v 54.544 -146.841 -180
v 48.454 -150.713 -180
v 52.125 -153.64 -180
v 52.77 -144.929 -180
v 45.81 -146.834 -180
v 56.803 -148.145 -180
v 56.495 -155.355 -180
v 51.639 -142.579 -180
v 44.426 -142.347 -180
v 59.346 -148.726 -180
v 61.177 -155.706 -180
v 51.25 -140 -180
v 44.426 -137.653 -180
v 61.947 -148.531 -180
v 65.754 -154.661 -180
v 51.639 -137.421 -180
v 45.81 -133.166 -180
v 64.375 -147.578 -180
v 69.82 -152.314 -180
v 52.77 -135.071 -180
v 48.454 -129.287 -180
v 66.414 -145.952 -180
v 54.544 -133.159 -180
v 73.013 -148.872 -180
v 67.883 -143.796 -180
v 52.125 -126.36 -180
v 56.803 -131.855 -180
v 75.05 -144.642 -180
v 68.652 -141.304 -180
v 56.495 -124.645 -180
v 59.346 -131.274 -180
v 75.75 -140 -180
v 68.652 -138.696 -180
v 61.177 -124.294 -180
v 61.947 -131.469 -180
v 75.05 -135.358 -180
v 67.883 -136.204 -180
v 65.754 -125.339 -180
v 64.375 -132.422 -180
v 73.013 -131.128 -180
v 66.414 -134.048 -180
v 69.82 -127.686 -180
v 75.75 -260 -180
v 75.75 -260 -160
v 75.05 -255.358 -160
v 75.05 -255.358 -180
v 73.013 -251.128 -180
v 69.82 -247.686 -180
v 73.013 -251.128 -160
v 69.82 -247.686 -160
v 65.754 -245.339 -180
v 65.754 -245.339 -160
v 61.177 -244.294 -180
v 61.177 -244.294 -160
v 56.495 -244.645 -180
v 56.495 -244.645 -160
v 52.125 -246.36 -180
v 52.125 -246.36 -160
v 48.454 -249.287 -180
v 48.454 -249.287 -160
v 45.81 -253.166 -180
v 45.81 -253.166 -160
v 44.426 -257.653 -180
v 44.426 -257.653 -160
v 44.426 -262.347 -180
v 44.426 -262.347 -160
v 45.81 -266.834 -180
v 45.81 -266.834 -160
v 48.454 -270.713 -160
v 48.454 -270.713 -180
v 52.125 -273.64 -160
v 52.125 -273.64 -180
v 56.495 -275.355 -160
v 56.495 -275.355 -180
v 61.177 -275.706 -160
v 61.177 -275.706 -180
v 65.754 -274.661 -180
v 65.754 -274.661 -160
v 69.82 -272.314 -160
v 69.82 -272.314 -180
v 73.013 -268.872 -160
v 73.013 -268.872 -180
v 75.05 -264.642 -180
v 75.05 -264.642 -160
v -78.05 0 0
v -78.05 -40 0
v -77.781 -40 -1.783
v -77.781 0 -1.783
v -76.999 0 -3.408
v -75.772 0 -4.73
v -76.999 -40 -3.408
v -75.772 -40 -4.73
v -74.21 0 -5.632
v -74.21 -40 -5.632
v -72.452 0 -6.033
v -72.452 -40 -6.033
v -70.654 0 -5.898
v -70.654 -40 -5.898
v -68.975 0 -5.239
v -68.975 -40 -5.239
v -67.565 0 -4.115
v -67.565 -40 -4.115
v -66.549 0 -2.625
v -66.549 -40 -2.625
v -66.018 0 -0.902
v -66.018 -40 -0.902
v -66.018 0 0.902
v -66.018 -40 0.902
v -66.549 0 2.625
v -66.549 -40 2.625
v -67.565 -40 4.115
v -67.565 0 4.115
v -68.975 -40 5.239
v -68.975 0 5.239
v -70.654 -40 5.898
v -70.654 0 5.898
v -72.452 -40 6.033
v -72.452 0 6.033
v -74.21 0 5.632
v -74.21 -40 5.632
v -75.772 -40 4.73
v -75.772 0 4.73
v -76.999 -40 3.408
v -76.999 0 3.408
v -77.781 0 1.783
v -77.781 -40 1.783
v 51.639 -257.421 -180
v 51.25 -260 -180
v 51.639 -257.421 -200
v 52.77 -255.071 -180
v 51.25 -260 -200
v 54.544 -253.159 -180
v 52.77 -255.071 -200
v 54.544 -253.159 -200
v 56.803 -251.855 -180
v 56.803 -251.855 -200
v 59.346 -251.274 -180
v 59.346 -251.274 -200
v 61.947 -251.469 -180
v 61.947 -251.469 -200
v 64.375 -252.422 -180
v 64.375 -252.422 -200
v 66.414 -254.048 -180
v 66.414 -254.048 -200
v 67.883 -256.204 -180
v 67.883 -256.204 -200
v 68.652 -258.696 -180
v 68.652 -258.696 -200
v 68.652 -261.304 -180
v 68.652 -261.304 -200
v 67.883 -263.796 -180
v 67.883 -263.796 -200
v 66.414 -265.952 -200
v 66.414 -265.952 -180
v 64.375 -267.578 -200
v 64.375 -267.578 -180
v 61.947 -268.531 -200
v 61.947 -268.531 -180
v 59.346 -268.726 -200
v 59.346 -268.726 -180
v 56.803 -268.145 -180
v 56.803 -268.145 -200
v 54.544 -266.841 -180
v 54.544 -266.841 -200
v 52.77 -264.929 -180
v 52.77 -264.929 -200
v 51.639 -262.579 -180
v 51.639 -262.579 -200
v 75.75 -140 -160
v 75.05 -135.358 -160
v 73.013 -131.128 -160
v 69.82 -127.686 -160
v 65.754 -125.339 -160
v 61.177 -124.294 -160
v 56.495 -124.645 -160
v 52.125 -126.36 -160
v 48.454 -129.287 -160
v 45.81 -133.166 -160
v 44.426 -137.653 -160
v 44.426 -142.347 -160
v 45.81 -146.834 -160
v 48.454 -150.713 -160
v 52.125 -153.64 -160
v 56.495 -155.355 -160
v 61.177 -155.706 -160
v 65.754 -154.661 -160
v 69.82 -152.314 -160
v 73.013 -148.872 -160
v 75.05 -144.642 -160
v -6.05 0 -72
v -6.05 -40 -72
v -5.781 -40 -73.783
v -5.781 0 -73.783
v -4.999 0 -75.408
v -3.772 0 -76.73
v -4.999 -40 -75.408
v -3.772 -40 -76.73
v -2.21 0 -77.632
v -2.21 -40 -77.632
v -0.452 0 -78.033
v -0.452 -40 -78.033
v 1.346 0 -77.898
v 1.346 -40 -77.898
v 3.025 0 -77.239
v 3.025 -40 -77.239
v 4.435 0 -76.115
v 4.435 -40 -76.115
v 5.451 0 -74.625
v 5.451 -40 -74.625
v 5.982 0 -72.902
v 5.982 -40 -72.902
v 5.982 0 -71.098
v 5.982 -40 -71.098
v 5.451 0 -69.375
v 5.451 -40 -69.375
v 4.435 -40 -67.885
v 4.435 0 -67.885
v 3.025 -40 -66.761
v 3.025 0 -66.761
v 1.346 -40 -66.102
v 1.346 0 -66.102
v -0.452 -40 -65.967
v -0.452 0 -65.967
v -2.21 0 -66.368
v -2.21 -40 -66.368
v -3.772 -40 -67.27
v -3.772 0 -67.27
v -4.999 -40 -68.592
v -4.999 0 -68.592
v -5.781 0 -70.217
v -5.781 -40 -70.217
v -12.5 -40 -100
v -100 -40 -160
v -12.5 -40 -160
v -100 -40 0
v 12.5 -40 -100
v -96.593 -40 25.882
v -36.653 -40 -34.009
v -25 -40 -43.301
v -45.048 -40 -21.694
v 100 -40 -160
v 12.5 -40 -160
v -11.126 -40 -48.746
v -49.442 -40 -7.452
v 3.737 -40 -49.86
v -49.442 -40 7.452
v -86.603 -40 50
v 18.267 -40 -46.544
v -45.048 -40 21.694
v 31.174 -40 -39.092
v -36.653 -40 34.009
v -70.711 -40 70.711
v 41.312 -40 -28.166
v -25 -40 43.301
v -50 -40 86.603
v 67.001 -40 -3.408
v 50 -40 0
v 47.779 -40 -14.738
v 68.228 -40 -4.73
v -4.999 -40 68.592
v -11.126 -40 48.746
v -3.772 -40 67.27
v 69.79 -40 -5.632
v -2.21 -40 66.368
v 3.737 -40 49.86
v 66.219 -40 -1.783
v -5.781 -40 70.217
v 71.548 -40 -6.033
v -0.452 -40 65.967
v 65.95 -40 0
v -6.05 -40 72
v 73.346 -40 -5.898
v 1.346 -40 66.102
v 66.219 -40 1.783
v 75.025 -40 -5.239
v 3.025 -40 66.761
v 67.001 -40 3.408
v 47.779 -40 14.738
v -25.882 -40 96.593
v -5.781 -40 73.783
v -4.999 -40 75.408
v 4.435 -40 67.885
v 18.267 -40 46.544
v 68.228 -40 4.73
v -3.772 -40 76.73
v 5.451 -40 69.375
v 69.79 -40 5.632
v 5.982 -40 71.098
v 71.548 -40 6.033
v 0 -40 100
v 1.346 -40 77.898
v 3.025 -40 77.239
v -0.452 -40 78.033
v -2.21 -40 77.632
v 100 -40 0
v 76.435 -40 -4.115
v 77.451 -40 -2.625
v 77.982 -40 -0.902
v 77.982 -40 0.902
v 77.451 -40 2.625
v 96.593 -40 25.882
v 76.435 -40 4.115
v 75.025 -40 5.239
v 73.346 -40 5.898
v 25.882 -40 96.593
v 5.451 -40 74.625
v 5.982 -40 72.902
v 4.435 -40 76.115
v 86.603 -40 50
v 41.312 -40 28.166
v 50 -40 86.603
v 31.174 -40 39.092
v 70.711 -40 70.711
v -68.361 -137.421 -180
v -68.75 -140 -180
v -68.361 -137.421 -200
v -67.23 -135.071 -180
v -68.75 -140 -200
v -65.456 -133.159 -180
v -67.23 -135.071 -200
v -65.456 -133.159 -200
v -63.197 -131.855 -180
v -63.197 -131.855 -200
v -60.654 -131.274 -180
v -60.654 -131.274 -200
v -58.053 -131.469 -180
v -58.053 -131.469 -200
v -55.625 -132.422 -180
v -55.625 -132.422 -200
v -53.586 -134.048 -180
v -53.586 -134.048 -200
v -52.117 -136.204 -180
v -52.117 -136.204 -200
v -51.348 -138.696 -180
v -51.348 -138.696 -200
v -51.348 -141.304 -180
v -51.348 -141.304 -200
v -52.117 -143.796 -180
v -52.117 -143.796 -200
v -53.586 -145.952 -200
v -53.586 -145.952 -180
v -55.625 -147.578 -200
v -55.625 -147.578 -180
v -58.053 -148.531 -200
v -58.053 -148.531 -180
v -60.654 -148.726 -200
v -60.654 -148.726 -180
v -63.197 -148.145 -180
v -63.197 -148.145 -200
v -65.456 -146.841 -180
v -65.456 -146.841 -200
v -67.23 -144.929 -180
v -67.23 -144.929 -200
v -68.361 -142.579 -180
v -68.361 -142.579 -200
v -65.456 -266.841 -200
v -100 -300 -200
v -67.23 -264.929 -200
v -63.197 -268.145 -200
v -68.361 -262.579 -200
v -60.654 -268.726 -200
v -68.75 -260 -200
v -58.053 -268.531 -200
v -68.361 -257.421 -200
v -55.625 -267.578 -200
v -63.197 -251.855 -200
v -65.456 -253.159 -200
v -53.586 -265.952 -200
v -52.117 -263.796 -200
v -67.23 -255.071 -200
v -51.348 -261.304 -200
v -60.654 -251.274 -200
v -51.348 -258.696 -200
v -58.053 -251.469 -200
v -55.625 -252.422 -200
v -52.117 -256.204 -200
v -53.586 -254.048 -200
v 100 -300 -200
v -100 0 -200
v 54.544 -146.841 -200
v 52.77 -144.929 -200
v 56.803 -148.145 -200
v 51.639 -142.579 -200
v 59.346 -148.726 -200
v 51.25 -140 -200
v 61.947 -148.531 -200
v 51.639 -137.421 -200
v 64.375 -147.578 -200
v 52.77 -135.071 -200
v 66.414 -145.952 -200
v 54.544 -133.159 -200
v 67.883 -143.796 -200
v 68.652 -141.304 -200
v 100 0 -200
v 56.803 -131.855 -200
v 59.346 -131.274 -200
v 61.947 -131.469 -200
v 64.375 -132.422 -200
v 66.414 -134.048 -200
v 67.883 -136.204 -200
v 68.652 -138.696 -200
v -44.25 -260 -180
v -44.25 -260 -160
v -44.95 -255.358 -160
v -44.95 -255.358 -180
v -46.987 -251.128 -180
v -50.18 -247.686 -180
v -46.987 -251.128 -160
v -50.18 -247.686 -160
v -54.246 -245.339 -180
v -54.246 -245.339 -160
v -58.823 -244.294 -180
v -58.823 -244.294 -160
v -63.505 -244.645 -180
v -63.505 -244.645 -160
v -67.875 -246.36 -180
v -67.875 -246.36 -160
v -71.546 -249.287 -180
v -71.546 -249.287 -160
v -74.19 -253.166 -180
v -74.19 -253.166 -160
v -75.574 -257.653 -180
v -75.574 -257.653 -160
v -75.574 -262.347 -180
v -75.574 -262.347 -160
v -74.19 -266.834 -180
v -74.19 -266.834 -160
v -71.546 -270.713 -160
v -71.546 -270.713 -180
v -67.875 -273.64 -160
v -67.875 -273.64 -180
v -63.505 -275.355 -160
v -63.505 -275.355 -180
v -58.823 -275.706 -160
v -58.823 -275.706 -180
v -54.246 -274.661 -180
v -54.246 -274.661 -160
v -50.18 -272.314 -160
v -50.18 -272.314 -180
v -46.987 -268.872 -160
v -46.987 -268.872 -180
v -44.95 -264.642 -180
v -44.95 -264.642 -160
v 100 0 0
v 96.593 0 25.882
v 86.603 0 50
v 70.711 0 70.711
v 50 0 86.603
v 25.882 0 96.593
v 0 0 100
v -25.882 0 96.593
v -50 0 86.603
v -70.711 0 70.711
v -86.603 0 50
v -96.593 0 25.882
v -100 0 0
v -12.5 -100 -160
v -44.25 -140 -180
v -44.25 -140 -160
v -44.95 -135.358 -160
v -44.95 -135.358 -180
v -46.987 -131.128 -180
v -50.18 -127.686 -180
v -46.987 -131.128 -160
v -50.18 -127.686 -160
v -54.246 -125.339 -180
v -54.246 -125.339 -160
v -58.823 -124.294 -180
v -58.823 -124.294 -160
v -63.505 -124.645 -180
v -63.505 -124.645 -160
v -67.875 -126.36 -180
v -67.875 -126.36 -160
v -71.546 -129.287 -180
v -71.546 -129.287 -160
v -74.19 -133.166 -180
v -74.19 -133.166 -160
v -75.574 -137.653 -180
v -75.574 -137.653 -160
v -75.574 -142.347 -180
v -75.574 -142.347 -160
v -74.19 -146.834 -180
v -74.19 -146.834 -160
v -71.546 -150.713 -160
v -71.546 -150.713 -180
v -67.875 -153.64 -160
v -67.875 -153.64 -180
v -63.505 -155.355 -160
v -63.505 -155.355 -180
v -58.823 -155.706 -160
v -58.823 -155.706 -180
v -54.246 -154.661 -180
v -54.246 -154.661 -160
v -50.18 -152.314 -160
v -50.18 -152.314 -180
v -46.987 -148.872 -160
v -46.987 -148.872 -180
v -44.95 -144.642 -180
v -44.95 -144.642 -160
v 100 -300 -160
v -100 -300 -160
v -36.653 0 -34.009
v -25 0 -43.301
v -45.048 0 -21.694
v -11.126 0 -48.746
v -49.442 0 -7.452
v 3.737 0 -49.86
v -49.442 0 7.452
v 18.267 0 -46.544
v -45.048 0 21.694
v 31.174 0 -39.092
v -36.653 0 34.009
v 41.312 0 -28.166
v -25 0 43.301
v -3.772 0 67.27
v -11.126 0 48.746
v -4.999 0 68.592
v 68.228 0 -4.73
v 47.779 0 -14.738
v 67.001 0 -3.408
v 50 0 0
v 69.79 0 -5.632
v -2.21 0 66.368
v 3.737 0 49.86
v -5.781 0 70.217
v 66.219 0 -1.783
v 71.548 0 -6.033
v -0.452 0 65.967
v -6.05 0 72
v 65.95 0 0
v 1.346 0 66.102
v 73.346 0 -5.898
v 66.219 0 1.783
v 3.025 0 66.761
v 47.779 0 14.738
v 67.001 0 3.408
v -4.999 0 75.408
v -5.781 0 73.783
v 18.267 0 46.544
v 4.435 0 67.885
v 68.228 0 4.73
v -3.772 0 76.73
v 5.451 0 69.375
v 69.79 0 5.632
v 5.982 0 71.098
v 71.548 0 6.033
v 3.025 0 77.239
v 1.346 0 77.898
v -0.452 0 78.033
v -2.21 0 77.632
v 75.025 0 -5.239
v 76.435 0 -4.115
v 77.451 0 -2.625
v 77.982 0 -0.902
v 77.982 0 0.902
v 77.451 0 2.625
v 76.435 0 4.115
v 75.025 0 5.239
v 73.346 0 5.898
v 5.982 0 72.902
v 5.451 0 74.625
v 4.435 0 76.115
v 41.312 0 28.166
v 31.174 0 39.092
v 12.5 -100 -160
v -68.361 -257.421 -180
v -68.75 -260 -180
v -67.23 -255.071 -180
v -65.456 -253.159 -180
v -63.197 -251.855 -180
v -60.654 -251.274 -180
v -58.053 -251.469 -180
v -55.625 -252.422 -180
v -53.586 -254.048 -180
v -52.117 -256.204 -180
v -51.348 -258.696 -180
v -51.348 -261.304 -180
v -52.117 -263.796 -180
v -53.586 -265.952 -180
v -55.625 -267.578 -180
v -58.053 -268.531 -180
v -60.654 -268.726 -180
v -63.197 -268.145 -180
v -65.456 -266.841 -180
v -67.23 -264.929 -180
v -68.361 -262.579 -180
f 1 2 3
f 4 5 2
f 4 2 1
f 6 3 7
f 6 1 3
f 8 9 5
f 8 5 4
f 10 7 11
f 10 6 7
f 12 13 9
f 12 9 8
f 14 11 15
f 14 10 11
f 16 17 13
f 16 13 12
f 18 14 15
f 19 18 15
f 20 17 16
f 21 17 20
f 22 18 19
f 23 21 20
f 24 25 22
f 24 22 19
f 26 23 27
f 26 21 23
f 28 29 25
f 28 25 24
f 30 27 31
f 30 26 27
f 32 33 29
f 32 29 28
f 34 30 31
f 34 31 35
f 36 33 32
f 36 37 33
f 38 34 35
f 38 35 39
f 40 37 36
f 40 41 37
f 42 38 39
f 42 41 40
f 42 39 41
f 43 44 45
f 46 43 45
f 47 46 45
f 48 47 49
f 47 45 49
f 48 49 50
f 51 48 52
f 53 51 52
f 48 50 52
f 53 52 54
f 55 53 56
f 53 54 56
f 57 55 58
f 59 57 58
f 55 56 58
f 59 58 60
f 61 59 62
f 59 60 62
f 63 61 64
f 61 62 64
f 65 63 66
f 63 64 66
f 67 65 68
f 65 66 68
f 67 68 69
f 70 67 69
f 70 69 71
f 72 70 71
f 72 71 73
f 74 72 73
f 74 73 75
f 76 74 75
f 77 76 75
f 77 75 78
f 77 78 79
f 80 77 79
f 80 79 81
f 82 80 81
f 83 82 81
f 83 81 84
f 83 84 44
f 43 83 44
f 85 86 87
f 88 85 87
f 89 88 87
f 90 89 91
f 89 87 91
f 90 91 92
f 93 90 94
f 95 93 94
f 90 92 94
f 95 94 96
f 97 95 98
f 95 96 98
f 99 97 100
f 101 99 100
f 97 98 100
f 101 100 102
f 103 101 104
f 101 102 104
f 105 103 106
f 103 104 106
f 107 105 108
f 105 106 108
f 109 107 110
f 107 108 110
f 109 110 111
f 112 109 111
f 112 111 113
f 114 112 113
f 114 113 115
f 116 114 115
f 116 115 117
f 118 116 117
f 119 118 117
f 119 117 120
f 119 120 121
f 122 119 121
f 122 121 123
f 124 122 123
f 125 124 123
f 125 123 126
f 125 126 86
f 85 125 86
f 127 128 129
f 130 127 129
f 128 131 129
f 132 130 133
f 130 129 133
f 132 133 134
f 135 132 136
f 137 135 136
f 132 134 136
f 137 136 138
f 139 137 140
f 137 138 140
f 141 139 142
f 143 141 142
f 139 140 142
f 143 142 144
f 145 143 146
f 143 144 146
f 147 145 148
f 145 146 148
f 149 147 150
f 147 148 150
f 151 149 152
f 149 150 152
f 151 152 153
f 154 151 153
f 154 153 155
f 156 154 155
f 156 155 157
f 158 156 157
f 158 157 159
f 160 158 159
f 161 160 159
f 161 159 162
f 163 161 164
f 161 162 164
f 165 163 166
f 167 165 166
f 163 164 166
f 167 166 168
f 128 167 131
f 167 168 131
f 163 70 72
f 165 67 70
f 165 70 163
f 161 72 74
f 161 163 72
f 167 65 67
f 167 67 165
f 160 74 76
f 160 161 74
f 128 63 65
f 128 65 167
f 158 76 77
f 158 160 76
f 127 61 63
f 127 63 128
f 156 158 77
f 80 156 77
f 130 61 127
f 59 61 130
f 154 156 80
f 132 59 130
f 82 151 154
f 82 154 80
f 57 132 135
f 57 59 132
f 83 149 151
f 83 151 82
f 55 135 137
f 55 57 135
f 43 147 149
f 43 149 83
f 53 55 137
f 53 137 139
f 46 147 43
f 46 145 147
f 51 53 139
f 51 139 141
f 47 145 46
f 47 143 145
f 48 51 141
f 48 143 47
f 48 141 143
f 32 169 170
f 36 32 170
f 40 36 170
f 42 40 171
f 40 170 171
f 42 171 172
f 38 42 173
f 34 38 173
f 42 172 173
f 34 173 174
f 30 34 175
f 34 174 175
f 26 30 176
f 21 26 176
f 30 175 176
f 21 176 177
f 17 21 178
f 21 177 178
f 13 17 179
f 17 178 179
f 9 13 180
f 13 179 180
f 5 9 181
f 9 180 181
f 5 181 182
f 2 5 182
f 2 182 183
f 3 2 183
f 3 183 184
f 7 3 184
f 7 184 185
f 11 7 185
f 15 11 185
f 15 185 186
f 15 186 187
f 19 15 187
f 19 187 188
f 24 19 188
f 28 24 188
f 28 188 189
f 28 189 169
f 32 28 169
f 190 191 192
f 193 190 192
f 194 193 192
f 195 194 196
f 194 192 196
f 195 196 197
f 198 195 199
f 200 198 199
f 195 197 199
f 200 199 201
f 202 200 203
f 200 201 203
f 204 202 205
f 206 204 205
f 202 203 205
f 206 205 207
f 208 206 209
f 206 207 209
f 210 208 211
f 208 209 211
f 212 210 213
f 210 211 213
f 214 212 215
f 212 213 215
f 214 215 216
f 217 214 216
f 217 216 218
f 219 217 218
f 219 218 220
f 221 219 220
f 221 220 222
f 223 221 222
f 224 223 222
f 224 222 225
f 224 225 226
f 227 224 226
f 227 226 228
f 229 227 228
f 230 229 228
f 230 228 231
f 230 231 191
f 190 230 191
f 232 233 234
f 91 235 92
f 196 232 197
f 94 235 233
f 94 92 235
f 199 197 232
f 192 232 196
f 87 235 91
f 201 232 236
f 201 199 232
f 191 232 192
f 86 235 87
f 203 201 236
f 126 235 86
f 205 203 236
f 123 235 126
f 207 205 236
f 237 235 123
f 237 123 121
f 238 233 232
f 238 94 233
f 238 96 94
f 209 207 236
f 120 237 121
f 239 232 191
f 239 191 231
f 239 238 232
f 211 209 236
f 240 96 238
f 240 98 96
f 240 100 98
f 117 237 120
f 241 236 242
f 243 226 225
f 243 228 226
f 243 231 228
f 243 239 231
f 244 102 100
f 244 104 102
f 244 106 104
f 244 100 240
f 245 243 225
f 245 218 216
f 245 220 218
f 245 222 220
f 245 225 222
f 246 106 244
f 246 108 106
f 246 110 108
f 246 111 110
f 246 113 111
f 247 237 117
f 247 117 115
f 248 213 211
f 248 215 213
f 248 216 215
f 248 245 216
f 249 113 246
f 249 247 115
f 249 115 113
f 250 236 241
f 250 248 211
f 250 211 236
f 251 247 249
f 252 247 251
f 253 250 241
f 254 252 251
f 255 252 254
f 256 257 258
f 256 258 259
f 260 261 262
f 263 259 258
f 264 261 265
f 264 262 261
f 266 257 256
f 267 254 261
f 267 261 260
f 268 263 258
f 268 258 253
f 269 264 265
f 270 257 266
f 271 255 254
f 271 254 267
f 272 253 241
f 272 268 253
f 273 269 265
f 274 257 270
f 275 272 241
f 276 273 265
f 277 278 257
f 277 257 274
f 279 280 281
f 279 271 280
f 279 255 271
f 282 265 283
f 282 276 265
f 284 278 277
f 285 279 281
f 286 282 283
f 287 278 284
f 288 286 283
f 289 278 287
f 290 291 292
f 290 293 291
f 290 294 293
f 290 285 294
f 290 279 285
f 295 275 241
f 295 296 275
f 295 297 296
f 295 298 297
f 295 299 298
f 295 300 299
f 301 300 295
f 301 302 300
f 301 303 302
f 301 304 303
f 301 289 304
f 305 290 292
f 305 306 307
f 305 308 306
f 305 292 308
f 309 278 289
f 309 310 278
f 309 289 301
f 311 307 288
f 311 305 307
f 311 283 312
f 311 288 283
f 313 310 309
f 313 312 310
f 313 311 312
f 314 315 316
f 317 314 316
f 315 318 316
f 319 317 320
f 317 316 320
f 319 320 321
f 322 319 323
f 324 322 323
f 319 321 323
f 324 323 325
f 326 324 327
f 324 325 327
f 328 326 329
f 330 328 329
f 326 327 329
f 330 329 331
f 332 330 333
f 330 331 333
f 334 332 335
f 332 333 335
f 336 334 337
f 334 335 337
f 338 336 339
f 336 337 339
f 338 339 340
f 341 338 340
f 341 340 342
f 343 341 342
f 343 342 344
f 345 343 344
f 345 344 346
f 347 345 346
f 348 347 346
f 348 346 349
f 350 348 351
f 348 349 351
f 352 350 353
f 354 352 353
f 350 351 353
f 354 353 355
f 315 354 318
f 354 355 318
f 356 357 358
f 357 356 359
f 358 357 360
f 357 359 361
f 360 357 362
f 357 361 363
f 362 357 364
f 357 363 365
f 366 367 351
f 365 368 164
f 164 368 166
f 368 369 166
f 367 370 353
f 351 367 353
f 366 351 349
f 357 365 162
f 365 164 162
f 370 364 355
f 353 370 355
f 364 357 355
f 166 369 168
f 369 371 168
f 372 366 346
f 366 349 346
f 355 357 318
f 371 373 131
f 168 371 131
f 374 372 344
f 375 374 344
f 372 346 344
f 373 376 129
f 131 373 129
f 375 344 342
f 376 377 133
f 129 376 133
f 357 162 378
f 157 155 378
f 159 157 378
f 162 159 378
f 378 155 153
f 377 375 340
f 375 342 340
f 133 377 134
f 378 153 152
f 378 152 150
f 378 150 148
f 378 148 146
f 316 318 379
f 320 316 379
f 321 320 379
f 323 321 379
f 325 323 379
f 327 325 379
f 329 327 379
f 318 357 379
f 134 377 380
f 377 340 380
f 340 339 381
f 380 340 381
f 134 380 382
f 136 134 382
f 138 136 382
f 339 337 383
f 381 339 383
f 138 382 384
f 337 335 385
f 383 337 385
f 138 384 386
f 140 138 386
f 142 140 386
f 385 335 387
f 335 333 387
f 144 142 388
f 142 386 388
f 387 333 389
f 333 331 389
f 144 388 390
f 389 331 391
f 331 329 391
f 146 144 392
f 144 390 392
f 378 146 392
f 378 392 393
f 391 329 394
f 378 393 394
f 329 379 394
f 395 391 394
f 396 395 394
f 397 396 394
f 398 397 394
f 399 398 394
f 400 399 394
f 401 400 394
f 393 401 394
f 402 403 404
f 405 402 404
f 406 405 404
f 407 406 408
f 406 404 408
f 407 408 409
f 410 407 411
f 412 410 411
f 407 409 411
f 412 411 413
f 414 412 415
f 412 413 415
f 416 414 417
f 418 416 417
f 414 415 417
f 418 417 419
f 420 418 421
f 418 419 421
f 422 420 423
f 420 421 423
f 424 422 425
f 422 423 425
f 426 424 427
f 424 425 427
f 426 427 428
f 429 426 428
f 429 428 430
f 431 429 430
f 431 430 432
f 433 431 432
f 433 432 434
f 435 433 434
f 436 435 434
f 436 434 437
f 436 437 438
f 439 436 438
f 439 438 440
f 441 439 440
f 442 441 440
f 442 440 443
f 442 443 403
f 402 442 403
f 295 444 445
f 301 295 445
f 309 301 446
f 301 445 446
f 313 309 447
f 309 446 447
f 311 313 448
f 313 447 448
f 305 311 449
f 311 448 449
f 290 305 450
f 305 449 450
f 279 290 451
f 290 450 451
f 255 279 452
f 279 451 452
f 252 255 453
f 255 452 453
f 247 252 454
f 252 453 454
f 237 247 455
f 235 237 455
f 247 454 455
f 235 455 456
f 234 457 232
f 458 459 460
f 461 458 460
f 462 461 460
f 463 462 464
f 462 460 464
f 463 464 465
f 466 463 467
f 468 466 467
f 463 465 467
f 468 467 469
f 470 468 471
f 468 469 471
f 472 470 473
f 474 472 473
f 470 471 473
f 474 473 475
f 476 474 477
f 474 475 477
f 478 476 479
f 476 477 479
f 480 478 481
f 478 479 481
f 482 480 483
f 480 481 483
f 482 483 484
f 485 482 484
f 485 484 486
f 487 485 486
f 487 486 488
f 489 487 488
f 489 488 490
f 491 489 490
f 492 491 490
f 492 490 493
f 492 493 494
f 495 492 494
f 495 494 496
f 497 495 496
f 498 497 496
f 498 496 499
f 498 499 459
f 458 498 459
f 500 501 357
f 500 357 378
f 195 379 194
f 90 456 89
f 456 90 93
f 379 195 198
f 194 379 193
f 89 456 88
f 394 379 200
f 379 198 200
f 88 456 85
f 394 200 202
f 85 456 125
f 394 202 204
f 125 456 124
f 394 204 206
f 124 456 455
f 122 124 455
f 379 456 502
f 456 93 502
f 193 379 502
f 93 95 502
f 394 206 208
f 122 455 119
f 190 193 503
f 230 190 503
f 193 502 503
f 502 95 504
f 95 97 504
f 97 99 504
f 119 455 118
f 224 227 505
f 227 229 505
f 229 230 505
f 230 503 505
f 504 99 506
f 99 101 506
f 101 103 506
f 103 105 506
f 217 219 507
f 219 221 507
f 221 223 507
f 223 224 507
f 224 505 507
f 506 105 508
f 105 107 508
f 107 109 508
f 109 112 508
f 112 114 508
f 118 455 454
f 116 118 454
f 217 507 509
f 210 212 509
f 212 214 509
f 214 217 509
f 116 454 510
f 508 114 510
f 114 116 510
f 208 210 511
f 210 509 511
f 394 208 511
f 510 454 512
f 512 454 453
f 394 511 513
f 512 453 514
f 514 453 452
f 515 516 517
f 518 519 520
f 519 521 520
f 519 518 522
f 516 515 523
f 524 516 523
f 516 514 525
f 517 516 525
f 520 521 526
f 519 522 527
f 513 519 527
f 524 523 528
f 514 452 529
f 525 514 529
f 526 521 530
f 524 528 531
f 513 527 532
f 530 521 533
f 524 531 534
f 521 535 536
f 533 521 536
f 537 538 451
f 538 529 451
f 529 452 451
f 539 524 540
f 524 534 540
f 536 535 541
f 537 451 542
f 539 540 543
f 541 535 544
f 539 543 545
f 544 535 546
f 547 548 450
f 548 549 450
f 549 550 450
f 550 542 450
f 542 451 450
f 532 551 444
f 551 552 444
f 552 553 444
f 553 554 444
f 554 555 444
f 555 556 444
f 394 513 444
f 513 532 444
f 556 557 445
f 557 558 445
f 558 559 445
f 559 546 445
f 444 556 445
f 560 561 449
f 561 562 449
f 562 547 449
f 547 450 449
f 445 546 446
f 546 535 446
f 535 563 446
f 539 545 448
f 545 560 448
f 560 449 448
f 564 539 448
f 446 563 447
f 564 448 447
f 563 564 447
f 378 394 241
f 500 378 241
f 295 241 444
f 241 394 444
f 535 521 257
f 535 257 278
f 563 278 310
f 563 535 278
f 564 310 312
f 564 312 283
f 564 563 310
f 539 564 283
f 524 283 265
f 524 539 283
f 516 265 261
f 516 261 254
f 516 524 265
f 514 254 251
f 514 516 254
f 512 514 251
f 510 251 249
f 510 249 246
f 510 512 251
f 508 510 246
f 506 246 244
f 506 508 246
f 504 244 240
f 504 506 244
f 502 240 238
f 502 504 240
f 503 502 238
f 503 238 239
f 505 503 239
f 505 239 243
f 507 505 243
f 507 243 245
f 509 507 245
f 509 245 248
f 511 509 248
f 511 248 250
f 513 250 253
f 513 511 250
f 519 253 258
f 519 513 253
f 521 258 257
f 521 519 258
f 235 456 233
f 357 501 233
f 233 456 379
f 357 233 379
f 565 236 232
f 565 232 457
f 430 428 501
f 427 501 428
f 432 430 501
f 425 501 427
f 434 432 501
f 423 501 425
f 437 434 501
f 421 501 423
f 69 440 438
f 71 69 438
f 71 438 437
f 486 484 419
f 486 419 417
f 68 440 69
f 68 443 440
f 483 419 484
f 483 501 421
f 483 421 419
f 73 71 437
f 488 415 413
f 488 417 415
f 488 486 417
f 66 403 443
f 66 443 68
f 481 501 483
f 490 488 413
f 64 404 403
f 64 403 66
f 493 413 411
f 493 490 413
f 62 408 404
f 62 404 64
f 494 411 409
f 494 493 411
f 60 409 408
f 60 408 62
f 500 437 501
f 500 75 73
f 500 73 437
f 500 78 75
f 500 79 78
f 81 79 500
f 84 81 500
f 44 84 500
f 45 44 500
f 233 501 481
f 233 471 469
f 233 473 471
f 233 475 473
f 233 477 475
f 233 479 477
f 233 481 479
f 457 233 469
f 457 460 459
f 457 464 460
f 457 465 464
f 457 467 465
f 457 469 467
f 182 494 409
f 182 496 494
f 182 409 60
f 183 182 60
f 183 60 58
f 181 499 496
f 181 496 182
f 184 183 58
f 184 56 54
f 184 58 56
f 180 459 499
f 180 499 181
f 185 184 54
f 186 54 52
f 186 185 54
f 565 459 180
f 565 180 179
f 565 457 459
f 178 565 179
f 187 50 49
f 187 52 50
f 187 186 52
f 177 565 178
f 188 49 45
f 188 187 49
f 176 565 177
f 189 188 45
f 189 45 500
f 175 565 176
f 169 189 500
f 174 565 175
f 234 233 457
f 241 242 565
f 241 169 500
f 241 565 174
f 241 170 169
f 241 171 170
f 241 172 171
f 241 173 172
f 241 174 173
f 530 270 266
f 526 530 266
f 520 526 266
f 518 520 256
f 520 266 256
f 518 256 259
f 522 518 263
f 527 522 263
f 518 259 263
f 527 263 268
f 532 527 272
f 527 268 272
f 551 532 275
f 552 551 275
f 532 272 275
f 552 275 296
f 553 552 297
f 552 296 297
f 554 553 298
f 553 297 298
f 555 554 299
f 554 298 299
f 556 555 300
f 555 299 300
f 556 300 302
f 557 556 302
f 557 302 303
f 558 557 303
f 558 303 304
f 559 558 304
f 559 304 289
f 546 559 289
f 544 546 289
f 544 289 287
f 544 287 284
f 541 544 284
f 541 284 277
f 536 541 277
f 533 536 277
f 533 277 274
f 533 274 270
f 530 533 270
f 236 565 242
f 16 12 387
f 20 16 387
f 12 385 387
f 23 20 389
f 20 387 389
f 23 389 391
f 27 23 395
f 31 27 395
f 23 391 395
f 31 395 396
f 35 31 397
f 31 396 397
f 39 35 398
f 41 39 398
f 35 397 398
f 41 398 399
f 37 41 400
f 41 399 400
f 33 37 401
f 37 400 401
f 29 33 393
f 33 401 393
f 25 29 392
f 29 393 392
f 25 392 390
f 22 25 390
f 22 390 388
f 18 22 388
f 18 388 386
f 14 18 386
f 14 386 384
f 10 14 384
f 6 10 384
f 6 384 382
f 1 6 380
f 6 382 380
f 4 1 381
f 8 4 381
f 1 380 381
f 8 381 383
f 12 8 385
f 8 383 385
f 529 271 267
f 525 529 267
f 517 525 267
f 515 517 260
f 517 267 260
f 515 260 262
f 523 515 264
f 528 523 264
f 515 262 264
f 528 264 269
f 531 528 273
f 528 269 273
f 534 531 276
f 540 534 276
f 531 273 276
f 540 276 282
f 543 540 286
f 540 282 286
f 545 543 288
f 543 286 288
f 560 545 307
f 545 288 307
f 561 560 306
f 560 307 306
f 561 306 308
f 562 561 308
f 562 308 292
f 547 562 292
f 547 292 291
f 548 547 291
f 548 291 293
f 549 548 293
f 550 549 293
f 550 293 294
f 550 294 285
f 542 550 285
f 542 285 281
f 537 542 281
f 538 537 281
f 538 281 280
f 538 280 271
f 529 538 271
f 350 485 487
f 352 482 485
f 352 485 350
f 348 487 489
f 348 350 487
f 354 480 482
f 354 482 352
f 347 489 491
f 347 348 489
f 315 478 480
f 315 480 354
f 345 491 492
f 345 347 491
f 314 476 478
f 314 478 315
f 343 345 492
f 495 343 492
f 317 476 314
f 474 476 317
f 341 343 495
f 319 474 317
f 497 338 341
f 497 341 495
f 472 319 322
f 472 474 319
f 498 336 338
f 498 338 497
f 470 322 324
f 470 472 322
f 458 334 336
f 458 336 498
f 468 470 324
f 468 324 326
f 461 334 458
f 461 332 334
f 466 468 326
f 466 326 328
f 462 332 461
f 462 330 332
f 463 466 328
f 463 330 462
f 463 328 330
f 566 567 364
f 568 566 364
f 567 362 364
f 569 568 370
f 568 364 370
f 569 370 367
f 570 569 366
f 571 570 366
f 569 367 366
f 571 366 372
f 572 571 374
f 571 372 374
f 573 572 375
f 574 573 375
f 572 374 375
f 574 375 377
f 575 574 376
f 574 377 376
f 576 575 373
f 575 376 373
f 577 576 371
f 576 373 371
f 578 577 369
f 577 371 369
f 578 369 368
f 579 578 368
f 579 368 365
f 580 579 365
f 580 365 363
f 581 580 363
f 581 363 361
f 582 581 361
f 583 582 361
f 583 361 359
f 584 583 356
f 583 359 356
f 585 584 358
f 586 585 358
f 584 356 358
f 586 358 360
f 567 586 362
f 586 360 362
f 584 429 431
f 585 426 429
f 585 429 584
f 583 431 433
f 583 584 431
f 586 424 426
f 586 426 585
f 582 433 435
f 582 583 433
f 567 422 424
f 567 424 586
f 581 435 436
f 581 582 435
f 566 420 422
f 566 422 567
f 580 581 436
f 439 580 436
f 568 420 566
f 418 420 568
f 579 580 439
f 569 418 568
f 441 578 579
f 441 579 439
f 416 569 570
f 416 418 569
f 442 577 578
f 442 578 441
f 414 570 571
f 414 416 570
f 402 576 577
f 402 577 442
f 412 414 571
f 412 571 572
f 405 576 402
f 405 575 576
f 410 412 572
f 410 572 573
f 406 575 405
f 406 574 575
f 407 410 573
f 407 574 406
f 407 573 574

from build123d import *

# Parameters (mm, degrees)
F0_R           = 7
F0_R_2         = 50
F0_W           = 200
F0_H           = 40
F1_DEPTH       = 40
F2_D           = 12.1
F3_DEPTH       = 300
F5_D           = 17.5
F5_CBORE_D     = 31.5
F5_CBORE_DEPTH = 20
F7_DEPTH       = 12.5


with BuildPart() as f1:
    # F0 (on Front) → F1 (new body)
    with BuildSketch(Plane.XZ):
        with BuildLine():
            ThreePointArc((-100, 0), (0, -100), (100, 0))
            ThreePointArc((100, 0), (0, 100), (-100, 0))
        make_face()
        with Locations((0, -72)):
            Circle(F0_R, mode=Mode.SUBTRACT)
        with Locations((-72, 0)):
            Circle(F0_R, mode=Mode.SUBTRACT)
        Circle(F0_R_2, mode=Mode.SUBTRACT)
        with Locations((72, 0)):
            Circle(F0_R, mode=Mode.SUBTRACT)
        with Locations((0, 72)):
            Circle(F0_R, mode=Mode.SUBTRACT)
        with BuildLine():
            Line((100, -160), (100, 0))
            ThreePointArc((100, 0), (0, -100), (-100, 0))
            Line((-100, 0), (-100, -160))
            Line((-100, -160), (100, -160))
        make_face()
        with Locations((0, -180)):
            Rectangle(F0_W, F0_H)
        with Locations((0, 72)):
            Circle(F0_R)
        with Locations((72, 0)):
            Circle(F0_R)
        with Locations((0, -72)):
            Circle(F0_R)
        with Locations((-72, 0)):
            Circle(F0_R)
    extrude(amount=F1_DEPTH)

    # F2 (through all)
    with Locations(Plane(origin=(0, 0, 0), x_dir=(1, 0, 0), z_dir=(0, 1, 0))):
        with Locations((-72, 0), (0, 72), (72, 0), (0, -72)):
            Hole(F2_D / 2)

    # F0 (on Front) → F3 (join)
    with BuildSketch(Plane.XZ):
        with Locations((0, -180)):
            Rectangle(F0_W, F0_H)
    extrude(amount=F3_DEPTH)

    # F5 (through all)
    with Locations(Plane.XY.offset(-160)):
        with Locations((60, -260), (-60, -260), (60, -140), (-60, -140)):
            CounterBoreHole(F5_D / 2, F5_CBORE_D / 2, F5_CBORE_DEPTH)

    # F6 (on Right) → F7 (join, symmetric)
    with BuildSketch(Plane.YZ):
        Polygon((-40, -160), (-40, -100), (-100, -160), align=None)
    extrude(amount=F7_DEPTH, both=True)


solid = f1.part
